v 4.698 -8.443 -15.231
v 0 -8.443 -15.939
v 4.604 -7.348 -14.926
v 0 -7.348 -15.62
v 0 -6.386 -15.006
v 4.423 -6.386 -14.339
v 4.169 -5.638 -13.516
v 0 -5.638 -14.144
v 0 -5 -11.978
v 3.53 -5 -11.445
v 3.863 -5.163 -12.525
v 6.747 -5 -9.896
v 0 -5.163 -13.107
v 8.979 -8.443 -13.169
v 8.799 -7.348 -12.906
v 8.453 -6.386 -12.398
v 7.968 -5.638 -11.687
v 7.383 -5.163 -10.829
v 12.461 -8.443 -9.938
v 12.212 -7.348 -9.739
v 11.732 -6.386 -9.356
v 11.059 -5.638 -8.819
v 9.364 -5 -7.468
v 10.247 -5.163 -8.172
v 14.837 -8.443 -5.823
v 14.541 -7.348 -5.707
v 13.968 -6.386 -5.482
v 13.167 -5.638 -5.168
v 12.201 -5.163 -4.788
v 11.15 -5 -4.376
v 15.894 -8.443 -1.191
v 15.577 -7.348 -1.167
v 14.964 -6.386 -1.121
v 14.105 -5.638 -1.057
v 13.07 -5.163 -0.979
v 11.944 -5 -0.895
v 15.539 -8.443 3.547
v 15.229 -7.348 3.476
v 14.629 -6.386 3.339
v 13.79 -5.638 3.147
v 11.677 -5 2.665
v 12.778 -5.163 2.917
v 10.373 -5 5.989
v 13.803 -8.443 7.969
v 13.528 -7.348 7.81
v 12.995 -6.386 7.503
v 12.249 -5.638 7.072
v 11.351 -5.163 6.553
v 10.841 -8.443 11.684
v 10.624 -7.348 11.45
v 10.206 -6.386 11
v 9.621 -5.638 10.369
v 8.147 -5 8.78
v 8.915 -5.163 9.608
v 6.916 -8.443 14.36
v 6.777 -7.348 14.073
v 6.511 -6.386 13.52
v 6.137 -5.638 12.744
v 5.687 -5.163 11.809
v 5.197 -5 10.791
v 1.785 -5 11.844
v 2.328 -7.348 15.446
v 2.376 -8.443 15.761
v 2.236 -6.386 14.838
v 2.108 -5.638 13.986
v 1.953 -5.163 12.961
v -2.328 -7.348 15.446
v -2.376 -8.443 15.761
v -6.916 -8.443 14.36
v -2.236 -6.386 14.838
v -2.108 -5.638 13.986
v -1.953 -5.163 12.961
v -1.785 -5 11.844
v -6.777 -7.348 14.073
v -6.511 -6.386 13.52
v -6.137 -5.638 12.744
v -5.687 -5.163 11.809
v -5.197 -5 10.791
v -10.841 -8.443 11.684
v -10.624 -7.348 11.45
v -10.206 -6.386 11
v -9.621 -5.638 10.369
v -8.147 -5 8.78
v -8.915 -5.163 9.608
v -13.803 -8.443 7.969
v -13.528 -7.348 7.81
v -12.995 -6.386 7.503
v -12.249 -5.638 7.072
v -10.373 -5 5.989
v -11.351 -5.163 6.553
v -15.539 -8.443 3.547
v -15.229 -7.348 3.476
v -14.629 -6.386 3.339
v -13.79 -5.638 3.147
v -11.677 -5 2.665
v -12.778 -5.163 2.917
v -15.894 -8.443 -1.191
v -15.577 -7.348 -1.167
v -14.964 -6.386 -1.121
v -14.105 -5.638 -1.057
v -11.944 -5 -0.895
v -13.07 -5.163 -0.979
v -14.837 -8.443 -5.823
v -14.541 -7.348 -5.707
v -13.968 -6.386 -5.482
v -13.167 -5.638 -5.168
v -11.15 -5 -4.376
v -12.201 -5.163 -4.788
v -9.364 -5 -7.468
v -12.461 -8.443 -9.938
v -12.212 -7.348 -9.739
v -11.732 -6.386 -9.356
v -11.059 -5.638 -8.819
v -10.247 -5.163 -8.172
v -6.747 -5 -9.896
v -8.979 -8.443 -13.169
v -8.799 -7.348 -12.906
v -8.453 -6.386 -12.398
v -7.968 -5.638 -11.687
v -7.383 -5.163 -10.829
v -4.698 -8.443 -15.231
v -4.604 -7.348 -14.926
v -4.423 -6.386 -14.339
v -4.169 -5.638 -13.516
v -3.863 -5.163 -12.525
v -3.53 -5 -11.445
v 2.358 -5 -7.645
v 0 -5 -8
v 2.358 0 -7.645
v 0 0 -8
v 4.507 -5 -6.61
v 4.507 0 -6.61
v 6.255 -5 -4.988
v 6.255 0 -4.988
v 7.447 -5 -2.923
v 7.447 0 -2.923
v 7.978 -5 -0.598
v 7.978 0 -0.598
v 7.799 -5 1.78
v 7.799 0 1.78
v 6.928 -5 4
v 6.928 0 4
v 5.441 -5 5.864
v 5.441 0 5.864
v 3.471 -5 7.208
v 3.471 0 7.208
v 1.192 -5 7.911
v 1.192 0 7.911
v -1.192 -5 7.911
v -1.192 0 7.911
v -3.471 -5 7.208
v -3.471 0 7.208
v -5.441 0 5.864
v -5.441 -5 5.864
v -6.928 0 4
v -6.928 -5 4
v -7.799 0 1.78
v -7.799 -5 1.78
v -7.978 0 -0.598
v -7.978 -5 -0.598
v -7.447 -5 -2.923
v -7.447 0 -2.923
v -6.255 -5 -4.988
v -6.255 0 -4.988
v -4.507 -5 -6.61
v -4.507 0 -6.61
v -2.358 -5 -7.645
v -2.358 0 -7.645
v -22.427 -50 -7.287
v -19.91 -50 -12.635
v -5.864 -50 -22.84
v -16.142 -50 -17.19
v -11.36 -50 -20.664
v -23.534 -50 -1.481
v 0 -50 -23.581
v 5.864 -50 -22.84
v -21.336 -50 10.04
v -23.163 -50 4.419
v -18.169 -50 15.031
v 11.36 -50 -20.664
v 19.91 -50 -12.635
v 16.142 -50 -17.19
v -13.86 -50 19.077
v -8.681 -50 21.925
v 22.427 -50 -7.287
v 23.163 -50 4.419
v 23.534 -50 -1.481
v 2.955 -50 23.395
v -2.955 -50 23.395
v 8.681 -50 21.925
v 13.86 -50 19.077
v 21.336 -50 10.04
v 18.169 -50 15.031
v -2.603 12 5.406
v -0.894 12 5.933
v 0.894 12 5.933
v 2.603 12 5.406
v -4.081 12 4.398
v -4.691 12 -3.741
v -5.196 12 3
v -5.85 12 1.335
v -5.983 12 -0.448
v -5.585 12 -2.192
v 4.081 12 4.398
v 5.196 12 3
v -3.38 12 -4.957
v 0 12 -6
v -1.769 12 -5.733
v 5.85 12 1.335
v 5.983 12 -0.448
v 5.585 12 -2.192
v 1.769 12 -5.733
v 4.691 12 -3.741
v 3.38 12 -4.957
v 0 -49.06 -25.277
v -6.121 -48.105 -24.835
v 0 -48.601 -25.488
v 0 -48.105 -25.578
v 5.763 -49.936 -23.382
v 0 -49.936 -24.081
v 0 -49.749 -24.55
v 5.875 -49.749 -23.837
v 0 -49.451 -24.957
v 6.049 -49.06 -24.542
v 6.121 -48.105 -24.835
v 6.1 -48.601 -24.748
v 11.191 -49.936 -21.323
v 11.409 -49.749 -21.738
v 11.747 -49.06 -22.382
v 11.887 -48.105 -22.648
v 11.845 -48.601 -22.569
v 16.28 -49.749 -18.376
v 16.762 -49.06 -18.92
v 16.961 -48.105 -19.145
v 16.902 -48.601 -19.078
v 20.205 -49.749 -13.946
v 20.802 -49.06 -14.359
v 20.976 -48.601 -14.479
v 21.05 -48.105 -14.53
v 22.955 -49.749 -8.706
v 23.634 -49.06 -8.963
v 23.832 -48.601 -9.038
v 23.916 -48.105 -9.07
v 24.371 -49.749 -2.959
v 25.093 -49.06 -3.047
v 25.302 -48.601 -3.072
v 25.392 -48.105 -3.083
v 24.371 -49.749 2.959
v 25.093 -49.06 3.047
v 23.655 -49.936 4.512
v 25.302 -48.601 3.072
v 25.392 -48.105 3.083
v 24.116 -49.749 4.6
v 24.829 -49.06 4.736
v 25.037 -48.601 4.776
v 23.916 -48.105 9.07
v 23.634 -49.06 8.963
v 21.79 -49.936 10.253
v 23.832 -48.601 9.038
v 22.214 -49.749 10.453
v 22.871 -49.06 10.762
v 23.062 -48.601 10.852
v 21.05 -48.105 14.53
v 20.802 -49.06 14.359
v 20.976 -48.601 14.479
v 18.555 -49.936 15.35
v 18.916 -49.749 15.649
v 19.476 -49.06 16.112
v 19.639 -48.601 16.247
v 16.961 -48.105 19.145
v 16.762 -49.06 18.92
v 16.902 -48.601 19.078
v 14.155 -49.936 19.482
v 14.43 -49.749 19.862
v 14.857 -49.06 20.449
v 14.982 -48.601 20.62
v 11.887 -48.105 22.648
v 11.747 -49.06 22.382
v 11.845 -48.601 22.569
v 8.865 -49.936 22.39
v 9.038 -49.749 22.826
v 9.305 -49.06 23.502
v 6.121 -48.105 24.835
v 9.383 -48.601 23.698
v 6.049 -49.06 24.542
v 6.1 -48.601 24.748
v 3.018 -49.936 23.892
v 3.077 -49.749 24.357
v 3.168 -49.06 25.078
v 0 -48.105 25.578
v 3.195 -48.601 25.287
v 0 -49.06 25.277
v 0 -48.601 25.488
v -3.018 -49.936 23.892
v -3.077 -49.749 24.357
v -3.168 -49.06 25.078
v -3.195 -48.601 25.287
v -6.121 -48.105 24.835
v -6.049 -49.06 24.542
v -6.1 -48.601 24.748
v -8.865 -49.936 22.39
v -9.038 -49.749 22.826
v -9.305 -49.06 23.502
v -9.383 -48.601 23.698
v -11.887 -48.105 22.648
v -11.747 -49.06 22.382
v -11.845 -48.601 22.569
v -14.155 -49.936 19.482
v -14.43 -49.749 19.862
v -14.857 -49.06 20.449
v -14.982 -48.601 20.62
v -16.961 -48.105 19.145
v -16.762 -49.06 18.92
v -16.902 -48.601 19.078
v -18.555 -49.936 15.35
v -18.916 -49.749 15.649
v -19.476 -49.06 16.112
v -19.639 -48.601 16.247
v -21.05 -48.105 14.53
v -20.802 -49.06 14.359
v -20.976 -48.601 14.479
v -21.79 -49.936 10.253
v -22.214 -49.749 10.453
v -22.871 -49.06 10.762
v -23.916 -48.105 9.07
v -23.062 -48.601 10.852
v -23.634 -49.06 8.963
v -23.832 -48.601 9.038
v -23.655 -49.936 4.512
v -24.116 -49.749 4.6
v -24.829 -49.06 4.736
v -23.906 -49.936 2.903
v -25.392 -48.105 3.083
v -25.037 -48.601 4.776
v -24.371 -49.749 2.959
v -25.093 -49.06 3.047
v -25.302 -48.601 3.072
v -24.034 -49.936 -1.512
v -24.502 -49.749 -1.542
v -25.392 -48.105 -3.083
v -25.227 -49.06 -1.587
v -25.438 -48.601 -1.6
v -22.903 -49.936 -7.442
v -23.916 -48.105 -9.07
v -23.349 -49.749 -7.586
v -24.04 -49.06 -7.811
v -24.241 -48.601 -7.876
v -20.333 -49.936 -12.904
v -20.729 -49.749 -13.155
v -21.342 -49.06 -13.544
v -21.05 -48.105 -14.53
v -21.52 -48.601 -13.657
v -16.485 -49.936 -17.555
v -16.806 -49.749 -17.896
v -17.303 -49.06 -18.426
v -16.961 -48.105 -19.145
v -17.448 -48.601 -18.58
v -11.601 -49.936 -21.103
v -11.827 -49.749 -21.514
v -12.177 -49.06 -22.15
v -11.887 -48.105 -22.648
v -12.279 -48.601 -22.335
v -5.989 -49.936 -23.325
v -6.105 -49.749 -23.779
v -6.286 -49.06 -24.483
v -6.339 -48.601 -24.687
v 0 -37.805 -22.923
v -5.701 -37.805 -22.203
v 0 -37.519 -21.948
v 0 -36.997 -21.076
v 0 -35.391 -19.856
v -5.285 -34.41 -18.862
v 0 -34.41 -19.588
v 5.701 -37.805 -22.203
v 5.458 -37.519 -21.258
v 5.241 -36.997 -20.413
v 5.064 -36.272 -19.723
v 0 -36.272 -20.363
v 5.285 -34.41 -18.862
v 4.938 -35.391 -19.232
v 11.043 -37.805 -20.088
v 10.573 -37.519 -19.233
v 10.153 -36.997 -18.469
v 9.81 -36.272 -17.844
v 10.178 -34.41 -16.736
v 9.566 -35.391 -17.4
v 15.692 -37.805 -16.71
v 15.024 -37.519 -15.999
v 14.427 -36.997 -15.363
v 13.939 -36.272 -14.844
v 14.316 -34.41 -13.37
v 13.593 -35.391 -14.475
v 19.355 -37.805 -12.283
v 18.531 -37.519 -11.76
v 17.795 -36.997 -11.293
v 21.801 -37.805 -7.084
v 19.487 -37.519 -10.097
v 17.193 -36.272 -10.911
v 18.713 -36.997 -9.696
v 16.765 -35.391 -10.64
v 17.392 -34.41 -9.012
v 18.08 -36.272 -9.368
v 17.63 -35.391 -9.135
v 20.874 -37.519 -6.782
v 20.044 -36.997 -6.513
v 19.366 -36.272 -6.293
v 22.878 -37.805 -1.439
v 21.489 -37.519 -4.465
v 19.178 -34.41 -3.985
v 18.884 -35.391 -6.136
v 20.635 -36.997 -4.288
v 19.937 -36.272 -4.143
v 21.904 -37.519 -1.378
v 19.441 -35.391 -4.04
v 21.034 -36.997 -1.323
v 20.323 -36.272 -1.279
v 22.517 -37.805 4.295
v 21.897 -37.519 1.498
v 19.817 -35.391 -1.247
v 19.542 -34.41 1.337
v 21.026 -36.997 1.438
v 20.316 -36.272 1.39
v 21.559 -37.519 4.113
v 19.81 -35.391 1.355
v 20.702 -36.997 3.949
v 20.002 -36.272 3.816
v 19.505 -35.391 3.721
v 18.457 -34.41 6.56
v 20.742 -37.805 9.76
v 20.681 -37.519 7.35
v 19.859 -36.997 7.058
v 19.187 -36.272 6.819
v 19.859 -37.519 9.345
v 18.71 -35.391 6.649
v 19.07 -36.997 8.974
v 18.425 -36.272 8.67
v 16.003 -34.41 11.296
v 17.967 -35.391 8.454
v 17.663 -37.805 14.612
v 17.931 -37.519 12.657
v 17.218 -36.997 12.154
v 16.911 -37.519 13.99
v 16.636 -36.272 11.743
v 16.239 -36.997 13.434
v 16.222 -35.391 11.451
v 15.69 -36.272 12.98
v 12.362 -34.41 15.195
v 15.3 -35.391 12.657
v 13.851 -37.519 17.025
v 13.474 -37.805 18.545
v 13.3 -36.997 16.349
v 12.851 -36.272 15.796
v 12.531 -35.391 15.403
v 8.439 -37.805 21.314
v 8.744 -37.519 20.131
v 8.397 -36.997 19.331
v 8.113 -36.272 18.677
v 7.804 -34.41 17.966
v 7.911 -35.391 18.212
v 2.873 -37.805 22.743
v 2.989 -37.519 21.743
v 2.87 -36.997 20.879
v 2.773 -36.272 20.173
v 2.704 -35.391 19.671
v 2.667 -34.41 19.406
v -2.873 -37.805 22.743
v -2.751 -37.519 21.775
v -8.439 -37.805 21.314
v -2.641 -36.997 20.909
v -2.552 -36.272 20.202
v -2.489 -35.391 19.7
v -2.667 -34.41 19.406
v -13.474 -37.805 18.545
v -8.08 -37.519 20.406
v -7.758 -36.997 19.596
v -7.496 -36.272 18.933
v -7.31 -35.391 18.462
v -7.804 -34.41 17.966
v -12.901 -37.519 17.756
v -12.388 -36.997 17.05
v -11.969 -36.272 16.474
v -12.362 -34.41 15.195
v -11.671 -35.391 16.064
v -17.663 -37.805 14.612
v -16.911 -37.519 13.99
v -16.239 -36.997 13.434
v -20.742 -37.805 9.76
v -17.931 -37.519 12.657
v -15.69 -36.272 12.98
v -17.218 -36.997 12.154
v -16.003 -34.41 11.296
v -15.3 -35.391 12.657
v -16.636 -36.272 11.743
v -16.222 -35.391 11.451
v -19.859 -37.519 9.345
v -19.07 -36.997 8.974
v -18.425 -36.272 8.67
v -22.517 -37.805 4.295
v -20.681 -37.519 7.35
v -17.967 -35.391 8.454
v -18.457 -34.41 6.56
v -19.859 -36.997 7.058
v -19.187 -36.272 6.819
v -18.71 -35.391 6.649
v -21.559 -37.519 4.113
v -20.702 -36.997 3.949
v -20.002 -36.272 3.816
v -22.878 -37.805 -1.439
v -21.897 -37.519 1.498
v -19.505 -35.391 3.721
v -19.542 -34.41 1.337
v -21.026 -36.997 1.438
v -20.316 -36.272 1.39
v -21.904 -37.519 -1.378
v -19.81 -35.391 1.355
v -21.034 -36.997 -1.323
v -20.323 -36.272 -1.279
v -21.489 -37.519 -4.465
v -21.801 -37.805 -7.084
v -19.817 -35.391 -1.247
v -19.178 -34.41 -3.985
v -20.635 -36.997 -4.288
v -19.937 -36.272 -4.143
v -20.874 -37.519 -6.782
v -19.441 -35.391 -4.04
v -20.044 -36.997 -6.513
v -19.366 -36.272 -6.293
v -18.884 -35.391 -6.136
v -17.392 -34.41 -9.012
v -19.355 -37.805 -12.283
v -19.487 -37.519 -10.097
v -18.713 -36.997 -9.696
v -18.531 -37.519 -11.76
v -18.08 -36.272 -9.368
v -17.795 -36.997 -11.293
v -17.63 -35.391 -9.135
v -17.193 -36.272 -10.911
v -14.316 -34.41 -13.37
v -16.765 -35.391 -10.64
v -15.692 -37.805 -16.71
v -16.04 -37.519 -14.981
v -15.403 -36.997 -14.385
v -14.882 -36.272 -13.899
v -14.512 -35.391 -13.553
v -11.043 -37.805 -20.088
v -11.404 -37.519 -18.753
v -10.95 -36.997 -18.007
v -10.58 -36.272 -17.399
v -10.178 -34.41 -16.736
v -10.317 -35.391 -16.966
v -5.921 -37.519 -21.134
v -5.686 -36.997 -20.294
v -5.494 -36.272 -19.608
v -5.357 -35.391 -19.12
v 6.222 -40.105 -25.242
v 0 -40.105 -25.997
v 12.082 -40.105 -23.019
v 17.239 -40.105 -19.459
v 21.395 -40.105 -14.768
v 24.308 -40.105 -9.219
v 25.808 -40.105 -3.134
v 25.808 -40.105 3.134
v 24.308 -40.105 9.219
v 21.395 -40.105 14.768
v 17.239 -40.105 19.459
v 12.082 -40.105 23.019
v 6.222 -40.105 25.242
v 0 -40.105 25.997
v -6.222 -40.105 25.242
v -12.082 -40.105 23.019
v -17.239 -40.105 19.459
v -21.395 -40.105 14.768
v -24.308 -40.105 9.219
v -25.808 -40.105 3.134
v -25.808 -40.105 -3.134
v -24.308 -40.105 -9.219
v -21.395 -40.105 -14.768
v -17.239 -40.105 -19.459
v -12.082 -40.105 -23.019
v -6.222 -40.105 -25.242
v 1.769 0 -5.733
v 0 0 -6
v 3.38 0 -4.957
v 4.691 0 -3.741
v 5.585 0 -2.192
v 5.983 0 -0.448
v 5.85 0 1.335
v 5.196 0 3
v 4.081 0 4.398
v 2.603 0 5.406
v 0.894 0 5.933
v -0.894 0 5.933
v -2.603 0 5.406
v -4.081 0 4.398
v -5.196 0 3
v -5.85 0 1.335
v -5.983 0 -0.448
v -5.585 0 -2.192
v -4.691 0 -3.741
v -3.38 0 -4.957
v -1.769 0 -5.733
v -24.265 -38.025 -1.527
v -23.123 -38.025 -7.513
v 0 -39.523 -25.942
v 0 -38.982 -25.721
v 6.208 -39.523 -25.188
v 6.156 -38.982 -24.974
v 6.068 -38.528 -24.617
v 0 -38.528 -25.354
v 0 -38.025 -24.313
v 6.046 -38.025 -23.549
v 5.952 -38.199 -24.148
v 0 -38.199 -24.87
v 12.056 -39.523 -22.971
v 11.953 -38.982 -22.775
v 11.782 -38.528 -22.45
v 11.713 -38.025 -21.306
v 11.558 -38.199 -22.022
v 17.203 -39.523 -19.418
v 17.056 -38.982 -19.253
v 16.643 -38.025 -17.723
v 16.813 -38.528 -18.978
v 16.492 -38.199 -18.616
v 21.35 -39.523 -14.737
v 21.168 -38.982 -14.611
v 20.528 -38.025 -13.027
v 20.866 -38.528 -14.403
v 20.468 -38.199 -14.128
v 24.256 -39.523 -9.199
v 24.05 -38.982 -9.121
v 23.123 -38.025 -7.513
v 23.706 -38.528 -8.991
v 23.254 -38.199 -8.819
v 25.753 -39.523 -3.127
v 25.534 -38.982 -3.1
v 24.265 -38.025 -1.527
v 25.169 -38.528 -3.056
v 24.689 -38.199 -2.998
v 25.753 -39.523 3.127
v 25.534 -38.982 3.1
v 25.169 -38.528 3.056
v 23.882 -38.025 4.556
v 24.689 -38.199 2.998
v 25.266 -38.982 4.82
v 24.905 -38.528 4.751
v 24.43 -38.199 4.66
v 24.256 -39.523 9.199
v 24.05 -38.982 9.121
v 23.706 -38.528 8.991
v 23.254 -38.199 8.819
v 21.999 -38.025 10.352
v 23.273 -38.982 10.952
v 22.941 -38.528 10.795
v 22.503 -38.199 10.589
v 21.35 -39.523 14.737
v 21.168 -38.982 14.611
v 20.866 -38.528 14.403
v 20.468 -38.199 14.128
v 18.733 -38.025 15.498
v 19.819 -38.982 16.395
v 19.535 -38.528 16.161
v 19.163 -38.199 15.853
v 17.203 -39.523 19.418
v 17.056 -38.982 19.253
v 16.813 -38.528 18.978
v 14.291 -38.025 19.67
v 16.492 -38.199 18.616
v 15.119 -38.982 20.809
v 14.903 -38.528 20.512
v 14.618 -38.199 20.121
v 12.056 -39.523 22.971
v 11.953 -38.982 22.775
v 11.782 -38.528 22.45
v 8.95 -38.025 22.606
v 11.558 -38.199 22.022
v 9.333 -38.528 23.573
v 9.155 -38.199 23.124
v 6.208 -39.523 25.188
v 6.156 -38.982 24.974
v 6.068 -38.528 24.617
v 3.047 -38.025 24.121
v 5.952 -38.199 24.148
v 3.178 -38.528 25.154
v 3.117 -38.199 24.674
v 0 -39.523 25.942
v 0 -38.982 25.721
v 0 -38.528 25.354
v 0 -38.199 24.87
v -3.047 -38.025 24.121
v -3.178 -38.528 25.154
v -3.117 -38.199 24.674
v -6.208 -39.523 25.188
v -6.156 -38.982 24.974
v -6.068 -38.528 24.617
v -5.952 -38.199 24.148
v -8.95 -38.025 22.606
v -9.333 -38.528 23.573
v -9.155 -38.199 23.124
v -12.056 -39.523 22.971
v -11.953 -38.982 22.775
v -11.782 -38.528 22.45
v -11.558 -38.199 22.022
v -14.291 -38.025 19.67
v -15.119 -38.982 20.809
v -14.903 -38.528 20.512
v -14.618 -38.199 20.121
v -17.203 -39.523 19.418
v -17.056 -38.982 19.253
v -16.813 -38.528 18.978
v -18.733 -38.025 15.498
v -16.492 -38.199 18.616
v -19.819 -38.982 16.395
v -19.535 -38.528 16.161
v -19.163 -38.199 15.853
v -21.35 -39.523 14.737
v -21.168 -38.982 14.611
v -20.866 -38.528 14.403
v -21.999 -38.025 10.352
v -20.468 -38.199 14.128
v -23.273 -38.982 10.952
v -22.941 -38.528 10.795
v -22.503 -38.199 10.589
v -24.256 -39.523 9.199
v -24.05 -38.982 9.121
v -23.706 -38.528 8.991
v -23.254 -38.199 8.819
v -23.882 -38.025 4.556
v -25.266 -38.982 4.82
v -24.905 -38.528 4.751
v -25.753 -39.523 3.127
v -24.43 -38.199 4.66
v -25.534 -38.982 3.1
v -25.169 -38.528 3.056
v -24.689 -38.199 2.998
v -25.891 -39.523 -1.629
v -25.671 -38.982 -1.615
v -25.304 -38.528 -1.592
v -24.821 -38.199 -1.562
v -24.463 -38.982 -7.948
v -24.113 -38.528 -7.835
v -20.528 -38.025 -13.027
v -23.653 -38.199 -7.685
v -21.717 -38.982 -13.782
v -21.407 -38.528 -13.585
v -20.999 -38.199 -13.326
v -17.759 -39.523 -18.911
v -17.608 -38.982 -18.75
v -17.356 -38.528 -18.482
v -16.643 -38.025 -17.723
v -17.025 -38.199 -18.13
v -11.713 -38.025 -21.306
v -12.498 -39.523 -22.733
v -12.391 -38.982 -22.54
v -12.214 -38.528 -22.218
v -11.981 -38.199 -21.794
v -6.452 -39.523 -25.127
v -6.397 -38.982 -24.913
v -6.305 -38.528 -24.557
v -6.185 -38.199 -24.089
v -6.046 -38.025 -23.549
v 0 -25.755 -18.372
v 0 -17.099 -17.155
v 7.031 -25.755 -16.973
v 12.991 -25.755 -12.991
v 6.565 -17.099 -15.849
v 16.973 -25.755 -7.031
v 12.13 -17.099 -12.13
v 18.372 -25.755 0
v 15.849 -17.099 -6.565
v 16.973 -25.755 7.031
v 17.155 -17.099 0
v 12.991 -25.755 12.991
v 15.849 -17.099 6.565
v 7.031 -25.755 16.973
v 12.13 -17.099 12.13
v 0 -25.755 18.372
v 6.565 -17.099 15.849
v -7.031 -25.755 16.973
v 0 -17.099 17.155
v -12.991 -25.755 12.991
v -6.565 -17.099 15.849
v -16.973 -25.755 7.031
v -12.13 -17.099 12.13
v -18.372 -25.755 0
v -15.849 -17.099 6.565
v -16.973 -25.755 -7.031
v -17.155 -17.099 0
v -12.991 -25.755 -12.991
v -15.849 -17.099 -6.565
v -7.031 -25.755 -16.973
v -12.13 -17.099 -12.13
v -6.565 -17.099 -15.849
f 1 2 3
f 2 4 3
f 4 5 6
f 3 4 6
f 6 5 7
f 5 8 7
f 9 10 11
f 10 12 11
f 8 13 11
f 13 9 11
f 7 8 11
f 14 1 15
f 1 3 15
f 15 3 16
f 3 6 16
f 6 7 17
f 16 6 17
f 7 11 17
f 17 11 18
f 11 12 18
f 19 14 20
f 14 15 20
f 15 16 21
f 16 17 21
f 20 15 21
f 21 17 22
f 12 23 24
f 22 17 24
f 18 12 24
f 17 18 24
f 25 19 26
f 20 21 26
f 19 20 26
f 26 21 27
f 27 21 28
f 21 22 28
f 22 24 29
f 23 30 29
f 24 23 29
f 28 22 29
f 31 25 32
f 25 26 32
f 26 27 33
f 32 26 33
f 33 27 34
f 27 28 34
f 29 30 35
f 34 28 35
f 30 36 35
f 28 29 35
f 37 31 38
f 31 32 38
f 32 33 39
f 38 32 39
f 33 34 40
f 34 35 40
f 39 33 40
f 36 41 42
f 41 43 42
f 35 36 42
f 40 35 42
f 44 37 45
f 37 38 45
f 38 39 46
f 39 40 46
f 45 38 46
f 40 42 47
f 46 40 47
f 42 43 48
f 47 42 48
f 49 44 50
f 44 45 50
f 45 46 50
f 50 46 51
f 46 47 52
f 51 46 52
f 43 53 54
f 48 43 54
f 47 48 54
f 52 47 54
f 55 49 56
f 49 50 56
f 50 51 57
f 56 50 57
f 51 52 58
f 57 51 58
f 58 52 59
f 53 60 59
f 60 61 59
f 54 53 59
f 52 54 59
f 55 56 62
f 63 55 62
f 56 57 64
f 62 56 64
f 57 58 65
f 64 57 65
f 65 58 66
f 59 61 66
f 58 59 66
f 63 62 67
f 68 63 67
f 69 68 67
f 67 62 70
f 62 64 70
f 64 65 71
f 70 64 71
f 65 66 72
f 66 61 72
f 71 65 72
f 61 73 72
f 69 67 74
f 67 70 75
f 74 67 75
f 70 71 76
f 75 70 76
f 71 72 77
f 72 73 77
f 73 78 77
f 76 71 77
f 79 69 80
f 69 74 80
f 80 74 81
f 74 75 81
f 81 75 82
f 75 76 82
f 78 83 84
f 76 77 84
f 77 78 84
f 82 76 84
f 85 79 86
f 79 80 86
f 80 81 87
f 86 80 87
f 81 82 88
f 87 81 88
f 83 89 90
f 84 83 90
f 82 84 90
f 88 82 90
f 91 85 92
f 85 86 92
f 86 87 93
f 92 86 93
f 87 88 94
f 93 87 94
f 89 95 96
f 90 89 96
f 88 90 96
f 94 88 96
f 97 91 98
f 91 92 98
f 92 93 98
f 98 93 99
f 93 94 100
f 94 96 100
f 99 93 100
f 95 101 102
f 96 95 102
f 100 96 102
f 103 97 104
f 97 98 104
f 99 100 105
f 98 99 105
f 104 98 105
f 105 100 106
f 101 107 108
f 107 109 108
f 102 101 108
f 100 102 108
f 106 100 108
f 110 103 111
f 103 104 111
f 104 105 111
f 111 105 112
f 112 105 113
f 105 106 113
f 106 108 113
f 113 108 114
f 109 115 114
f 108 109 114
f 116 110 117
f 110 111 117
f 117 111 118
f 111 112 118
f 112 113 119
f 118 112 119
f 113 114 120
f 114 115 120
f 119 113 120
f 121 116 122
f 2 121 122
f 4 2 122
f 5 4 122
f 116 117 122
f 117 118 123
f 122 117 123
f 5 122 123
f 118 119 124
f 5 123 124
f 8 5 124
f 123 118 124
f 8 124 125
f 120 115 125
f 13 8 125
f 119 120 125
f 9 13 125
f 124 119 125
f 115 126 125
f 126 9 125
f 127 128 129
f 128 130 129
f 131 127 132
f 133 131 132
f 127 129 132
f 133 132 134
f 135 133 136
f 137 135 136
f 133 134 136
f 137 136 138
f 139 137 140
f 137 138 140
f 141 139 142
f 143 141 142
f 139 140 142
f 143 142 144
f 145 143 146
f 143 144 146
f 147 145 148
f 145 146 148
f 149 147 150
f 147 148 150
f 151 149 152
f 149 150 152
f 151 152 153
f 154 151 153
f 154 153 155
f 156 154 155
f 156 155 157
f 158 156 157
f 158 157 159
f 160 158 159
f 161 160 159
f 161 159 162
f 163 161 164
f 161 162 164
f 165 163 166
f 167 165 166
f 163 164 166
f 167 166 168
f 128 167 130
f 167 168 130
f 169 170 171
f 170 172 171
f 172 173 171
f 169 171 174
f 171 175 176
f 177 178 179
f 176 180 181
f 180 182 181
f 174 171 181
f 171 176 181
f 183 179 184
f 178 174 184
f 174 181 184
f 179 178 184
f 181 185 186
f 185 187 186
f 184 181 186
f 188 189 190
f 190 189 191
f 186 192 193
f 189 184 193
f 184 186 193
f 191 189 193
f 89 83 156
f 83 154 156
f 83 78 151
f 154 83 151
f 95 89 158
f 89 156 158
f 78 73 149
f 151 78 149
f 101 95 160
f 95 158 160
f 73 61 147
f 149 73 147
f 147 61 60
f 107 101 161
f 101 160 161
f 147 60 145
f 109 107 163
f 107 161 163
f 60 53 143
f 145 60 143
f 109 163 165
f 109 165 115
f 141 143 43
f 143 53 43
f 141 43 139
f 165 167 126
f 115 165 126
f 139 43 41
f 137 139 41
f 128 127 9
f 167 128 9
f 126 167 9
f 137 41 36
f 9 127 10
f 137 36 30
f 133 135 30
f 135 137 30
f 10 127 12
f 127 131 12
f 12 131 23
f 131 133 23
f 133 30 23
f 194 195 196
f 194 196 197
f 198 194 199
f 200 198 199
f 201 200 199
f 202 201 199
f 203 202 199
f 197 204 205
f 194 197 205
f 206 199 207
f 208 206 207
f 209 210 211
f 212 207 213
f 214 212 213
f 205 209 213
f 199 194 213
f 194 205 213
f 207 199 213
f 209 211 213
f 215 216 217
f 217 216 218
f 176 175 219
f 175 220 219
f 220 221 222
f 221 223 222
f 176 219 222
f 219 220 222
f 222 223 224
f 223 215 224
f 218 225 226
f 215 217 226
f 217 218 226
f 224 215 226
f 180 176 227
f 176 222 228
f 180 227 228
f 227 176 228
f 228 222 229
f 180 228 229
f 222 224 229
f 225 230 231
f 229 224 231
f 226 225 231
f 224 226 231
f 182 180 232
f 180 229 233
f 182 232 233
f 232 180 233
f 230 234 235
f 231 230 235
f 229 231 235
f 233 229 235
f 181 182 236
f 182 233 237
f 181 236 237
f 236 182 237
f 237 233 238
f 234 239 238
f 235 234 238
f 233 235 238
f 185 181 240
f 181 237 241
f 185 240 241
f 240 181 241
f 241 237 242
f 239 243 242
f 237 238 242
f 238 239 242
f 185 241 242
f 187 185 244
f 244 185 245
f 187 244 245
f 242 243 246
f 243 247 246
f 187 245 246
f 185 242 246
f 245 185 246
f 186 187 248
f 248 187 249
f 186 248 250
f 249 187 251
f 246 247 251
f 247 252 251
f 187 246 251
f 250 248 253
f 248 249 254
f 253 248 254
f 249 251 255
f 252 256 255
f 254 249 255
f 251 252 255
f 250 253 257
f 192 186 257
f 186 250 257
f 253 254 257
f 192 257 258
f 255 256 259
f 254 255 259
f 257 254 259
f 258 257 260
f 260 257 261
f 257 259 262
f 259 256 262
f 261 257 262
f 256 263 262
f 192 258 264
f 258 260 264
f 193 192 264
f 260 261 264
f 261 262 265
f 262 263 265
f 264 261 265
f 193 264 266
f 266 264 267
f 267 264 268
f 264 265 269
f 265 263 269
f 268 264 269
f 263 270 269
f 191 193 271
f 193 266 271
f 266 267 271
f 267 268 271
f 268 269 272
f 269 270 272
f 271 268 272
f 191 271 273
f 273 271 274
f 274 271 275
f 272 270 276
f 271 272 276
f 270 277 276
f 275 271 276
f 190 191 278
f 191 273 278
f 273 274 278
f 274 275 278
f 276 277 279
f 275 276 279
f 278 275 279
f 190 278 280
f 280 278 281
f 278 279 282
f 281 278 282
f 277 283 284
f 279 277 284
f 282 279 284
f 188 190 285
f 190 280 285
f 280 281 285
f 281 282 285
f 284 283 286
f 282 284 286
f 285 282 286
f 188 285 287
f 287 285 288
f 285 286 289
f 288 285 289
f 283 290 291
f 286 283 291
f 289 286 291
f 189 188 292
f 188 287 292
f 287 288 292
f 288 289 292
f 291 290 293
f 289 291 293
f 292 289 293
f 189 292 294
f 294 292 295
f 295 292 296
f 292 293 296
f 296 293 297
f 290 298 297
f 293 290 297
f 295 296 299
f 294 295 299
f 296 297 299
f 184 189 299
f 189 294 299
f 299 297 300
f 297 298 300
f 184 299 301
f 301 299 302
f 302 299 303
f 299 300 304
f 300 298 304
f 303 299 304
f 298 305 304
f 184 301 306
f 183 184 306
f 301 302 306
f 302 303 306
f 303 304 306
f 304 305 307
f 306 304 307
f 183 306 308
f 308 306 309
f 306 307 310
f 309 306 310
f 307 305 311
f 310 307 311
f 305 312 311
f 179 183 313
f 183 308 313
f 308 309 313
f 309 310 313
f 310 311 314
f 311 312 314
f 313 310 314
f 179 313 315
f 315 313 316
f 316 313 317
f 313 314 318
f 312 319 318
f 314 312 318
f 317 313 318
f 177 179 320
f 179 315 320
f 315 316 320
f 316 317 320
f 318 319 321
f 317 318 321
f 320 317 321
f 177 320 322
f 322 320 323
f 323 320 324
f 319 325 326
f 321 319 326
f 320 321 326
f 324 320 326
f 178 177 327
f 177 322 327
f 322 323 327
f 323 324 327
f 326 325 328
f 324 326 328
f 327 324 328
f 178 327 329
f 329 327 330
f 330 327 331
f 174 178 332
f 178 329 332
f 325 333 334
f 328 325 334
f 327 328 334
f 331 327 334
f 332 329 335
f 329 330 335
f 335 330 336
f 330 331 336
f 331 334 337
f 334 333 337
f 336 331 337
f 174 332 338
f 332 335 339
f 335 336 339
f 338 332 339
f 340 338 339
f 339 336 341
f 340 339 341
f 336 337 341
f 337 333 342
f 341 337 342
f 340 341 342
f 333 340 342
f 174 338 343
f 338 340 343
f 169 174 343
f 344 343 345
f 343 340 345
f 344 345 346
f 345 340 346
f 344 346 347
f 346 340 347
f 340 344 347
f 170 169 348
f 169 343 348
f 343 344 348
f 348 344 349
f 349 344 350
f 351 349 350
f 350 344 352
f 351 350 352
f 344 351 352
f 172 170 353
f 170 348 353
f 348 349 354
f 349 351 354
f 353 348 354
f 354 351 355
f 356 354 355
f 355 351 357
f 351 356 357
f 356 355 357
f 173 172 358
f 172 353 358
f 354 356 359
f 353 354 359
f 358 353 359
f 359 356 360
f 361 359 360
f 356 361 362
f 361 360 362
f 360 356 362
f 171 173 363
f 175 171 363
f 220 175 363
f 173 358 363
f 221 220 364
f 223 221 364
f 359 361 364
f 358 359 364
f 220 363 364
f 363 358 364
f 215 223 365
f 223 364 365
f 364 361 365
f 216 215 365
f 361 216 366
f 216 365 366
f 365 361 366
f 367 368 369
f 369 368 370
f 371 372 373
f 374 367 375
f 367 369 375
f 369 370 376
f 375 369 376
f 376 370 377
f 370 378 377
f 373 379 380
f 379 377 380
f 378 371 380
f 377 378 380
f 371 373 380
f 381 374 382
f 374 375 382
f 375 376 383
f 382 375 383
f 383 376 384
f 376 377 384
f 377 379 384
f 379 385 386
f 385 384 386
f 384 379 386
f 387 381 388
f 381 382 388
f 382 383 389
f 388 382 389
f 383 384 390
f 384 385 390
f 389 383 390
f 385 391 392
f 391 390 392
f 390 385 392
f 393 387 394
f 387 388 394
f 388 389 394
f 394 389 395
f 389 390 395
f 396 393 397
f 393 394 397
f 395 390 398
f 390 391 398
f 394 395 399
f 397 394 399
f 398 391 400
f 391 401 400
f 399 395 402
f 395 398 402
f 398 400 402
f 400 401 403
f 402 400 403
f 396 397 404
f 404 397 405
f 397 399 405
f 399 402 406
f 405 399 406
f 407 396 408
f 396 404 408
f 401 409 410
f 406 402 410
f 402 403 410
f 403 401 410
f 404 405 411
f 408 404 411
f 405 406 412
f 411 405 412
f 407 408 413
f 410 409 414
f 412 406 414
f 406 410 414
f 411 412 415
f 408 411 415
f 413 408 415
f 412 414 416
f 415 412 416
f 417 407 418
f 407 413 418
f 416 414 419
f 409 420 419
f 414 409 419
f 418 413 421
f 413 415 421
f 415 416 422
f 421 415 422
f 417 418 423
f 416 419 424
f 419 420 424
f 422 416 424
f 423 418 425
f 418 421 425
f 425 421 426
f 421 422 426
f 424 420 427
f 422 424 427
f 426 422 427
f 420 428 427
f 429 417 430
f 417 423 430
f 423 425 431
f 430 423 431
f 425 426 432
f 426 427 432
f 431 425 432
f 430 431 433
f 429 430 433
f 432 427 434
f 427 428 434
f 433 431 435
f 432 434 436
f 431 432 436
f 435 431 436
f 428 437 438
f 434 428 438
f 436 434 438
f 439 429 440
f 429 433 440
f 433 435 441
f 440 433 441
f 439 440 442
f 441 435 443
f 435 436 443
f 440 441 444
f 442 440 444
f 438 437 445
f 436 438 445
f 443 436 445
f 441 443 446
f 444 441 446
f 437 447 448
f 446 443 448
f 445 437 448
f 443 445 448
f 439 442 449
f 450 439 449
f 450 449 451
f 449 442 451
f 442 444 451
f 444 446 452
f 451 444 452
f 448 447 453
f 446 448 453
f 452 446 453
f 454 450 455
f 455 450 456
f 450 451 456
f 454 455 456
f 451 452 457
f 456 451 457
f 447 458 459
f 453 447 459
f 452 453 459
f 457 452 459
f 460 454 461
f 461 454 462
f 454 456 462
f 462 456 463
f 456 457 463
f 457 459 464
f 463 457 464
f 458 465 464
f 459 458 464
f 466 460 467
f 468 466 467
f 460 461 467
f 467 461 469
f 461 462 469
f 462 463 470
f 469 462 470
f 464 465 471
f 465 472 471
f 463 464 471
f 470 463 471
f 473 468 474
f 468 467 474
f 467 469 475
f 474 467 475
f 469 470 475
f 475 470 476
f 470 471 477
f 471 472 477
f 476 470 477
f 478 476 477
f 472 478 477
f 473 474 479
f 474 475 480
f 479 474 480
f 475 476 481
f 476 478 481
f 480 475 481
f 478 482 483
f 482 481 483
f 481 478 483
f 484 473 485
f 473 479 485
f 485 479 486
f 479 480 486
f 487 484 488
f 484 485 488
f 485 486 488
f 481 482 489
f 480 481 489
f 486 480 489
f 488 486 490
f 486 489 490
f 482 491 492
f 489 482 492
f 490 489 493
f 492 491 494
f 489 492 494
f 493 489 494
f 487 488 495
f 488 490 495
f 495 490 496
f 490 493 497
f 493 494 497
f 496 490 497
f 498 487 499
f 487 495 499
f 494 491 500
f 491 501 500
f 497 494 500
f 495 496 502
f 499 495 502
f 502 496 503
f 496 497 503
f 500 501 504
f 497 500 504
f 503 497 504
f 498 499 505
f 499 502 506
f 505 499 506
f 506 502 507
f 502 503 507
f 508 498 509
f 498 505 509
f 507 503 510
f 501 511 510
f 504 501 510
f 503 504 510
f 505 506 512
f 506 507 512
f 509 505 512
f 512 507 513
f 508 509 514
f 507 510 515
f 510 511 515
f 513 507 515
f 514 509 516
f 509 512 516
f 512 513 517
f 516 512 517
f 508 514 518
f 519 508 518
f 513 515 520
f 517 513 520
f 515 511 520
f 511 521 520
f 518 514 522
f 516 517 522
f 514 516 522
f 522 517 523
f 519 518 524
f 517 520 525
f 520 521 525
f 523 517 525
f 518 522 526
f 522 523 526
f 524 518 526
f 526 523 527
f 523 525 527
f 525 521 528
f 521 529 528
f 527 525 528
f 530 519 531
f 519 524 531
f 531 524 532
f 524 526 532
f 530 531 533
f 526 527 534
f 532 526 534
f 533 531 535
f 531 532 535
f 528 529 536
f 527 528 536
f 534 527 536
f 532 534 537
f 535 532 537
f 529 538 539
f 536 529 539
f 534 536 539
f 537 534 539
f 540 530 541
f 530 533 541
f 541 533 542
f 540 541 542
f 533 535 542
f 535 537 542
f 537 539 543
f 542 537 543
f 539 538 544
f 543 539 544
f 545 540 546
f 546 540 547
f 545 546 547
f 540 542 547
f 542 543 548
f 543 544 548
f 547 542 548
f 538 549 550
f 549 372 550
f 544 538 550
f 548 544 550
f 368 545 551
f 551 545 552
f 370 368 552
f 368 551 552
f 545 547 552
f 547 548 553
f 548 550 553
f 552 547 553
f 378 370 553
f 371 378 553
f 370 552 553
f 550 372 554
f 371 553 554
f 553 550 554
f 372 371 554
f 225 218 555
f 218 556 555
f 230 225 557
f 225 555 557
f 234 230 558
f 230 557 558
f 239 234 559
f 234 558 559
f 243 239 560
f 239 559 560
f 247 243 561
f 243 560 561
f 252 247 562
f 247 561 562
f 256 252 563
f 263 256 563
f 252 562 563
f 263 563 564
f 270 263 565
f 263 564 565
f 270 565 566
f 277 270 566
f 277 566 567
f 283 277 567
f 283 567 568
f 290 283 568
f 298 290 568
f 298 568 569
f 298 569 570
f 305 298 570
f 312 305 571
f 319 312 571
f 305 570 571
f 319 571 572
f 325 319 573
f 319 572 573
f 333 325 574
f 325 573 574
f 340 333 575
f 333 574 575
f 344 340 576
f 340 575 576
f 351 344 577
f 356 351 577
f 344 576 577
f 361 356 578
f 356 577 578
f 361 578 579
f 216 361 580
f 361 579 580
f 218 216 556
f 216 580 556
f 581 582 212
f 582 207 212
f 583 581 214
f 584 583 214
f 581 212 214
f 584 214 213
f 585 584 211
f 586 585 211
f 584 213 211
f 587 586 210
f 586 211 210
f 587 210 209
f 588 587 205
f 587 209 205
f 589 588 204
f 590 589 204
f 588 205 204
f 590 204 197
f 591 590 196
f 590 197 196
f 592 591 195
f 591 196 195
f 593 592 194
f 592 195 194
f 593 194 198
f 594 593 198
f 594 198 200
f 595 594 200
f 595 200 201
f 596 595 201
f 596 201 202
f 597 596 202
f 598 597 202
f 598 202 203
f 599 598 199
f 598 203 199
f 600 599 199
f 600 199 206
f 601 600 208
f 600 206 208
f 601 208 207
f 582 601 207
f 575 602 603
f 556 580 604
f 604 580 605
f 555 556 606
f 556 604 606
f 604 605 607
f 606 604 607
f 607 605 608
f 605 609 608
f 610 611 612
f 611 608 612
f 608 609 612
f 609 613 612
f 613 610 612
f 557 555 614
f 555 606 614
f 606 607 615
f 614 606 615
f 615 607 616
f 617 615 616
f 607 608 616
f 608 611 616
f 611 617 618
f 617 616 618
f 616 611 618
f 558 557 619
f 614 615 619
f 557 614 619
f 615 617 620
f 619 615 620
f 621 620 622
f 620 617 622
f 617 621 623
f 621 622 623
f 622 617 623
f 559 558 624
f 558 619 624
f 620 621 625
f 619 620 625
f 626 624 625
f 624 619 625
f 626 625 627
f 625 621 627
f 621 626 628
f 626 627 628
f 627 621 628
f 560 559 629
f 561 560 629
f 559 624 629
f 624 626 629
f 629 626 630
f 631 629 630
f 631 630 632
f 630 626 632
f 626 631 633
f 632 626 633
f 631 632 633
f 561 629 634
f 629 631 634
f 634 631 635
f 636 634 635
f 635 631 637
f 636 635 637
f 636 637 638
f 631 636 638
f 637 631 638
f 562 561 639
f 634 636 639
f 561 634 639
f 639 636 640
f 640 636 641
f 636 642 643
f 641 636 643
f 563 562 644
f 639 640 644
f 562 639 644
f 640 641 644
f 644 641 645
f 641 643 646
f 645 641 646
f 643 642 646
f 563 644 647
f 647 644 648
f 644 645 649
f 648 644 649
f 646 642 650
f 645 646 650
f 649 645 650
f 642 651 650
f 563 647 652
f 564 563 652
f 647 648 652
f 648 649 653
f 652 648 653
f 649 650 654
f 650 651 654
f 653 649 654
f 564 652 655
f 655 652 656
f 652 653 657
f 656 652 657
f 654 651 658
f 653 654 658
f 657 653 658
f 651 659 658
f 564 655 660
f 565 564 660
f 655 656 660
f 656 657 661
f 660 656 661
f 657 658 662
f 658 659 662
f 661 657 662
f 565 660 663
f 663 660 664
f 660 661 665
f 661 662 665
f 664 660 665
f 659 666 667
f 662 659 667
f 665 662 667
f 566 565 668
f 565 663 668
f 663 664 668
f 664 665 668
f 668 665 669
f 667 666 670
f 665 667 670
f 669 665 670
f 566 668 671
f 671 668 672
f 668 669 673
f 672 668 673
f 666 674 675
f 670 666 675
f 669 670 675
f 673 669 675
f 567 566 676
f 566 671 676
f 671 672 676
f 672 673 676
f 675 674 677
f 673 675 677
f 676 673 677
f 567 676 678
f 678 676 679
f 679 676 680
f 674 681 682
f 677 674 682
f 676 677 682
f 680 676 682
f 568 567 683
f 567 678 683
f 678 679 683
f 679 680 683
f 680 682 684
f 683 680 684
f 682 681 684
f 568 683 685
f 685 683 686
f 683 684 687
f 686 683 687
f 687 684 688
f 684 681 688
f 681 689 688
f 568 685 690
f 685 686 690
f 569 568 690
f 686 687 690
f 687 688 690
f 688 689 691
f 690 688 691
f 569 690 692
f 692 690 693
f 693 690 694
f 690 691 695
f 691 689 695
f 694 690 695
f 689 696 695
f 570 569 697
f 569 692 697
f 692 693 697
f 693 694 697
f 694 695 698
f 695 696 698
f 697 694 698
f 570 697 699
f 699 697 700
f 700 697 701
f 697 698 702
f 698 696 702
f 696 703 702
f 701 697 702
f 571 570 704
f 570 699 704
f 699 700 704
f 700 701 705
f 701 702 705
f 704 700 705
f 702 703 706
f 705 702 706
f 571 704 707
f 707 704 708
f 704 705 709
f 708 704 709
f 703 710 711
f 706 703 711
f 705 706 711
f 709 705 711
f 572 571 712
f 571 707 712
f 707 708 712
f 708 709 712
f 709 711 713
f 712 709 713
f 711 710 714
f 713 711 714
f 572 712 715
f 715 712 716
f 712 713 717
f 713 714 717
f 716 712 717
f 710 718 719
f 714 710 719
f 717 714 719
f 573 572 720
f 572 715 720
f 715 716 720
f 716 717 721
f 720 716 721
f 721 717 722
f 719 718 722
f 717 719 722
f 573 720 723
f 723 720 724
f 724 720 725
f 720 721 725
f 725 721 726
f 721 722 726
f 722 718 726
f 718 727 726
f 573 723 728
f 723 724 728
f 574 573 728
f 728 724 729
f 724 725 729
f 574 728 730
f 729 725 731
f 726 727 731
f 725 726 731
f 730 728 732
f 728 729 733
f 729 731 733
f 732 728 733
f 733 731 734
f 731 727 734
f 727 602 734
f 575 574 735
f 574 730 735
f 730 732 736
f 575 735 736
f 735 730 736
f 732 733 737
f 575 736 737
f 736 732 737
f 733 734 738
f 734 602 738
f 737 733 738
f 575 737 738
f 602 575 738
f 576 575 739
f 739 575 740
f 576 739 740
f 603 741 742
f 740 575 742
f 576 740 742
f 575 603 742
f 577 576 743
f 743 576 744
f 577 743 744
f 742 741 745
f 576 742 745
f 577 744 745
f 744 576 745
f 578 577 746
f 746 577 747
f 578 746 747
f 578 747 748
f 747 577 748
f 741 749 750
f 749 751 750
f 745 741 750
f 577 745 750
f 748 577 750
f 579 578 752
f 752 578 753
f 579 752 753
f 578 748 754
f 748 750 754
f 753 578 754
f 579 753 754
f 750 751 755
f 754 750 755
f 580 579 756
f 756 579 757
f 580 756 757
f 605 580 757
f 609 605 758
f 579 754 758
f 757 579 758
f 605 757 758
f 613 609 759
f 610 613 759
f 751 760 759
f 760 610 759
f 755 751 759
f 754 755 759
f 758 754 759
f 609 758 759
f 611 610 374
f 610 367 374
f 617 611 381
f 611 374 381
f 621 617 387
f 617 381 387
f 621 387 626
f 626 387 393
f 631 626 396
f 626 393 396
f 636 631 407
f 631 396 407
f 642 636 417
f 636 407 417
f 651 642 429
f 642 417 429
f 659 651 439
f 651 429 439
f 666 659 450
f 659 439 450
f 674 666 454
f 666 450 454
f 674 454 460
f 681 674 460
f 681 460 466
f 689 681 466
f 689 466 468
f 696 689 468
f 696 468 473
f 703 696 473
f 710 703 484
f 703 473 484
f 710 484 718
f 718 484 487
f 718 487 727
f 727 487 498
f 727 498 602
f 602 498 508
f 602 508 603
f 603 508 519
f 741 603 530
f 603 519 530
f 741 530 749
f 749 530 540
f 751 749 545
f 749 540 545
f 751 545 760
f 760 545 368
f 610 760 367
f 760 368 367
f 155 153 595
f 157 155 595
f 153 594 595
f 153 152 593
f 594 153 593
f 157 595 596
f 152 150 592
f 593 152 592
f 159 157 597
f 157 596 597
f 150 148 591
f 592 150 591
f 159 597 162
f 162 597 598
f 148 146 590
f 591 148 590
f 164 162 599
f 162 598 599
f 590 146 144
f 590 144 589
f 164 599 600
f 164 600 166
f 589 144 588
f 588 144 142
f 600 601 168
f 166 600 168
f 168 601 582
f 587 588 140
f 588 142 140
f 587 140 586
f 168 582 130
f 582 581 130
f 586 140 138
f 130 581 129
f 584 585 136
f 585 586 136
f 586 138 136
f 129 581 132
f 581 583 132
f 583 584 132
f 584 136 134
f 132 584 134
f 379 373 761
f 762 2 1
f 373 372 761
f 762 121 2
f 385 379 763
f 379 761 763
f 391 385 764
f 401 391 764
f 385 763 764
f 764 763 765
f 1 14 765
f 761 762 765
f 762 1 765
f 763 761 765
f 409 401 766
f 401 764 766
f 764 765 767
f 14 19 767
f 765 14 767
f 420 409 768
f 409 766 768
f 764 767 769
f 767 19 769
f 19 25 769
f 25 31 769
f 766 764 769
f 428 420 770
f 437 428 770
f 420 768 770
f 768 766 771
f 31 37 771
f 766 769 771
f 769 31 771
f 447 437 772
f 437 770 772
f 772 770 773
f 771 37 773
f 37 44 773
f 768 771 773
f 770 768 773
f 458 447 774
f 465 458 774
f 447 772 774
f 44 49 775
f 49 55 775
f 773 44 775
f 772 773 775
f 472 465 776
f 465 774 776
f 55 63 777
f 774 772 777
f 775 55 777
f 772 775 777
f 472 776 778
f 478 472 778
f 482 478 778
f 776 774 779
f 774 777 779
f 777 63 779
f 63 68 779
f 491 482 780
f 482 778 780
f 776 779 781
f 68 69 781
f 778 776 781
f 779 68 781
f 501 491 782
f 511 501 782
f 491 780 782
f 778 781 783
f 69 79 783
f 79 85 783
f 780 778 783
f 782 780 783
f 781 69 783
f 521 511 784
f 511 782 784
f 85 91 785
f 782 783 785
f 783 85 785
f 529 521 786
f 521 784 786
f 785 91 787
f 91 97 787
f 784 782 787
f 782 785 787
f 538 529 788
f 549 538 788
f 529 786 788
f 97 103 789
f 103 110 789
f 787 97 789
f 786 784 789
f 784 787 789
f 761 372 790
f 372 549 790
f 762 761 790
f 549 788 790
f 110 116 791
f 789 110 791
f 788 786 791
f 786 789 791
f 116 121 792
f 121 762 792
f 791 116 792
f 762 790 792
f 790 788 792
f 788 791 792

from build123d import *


with BuildPart() as part:
    # Esquisse1 → Révolution1 (revolve)
    with BuildSketch(Plane(origin=(0, 0, 0), x_dir=(0, 0, -1), z_dir=(1, 0, 0))):
        with BuildLine():
            Line((8, -5), (8, 0))
            Line((8, 0), (6, 0))
            Line((6, 0), (6, 12))
            Line((6, 12), (0, 12))
            Line((0, 12), (0, -50))
            Line((0, -50), (23.580737766, -50))
            ThreePointArc((23.580737766, -50), (24.957446917, -49.450748742), (25.577996835, -48.104671912))
            Line((25.577996835, -48.104671912), (25.99725907, -40.104671912))
            ThreePointArc((25.99725907, -40.104671912), (25.554291923, -38.741359218), (24.31286893, -38.024623319))
            Line((24.31286893, -38.024623319), (22.923403705, -37.804553647))
            ThreePointArc((22.923403705, -37.804553647), (20.696139769, -36.657437342), (19.58806929, -34.410492688))
            Line((19.58806929, -34.410492688), (15.938619423, -8.443307596))
            ThreePointArc((15.938619423, -8.443307596), (14.601783264, -5.981161679), (11.977547148, -5))
            Line((11.977547148, -5), (8, -5))
        make_face()
    revolve(axis=Axis((0, 12, 0), (0, -1, 0)))


solid = part.part
